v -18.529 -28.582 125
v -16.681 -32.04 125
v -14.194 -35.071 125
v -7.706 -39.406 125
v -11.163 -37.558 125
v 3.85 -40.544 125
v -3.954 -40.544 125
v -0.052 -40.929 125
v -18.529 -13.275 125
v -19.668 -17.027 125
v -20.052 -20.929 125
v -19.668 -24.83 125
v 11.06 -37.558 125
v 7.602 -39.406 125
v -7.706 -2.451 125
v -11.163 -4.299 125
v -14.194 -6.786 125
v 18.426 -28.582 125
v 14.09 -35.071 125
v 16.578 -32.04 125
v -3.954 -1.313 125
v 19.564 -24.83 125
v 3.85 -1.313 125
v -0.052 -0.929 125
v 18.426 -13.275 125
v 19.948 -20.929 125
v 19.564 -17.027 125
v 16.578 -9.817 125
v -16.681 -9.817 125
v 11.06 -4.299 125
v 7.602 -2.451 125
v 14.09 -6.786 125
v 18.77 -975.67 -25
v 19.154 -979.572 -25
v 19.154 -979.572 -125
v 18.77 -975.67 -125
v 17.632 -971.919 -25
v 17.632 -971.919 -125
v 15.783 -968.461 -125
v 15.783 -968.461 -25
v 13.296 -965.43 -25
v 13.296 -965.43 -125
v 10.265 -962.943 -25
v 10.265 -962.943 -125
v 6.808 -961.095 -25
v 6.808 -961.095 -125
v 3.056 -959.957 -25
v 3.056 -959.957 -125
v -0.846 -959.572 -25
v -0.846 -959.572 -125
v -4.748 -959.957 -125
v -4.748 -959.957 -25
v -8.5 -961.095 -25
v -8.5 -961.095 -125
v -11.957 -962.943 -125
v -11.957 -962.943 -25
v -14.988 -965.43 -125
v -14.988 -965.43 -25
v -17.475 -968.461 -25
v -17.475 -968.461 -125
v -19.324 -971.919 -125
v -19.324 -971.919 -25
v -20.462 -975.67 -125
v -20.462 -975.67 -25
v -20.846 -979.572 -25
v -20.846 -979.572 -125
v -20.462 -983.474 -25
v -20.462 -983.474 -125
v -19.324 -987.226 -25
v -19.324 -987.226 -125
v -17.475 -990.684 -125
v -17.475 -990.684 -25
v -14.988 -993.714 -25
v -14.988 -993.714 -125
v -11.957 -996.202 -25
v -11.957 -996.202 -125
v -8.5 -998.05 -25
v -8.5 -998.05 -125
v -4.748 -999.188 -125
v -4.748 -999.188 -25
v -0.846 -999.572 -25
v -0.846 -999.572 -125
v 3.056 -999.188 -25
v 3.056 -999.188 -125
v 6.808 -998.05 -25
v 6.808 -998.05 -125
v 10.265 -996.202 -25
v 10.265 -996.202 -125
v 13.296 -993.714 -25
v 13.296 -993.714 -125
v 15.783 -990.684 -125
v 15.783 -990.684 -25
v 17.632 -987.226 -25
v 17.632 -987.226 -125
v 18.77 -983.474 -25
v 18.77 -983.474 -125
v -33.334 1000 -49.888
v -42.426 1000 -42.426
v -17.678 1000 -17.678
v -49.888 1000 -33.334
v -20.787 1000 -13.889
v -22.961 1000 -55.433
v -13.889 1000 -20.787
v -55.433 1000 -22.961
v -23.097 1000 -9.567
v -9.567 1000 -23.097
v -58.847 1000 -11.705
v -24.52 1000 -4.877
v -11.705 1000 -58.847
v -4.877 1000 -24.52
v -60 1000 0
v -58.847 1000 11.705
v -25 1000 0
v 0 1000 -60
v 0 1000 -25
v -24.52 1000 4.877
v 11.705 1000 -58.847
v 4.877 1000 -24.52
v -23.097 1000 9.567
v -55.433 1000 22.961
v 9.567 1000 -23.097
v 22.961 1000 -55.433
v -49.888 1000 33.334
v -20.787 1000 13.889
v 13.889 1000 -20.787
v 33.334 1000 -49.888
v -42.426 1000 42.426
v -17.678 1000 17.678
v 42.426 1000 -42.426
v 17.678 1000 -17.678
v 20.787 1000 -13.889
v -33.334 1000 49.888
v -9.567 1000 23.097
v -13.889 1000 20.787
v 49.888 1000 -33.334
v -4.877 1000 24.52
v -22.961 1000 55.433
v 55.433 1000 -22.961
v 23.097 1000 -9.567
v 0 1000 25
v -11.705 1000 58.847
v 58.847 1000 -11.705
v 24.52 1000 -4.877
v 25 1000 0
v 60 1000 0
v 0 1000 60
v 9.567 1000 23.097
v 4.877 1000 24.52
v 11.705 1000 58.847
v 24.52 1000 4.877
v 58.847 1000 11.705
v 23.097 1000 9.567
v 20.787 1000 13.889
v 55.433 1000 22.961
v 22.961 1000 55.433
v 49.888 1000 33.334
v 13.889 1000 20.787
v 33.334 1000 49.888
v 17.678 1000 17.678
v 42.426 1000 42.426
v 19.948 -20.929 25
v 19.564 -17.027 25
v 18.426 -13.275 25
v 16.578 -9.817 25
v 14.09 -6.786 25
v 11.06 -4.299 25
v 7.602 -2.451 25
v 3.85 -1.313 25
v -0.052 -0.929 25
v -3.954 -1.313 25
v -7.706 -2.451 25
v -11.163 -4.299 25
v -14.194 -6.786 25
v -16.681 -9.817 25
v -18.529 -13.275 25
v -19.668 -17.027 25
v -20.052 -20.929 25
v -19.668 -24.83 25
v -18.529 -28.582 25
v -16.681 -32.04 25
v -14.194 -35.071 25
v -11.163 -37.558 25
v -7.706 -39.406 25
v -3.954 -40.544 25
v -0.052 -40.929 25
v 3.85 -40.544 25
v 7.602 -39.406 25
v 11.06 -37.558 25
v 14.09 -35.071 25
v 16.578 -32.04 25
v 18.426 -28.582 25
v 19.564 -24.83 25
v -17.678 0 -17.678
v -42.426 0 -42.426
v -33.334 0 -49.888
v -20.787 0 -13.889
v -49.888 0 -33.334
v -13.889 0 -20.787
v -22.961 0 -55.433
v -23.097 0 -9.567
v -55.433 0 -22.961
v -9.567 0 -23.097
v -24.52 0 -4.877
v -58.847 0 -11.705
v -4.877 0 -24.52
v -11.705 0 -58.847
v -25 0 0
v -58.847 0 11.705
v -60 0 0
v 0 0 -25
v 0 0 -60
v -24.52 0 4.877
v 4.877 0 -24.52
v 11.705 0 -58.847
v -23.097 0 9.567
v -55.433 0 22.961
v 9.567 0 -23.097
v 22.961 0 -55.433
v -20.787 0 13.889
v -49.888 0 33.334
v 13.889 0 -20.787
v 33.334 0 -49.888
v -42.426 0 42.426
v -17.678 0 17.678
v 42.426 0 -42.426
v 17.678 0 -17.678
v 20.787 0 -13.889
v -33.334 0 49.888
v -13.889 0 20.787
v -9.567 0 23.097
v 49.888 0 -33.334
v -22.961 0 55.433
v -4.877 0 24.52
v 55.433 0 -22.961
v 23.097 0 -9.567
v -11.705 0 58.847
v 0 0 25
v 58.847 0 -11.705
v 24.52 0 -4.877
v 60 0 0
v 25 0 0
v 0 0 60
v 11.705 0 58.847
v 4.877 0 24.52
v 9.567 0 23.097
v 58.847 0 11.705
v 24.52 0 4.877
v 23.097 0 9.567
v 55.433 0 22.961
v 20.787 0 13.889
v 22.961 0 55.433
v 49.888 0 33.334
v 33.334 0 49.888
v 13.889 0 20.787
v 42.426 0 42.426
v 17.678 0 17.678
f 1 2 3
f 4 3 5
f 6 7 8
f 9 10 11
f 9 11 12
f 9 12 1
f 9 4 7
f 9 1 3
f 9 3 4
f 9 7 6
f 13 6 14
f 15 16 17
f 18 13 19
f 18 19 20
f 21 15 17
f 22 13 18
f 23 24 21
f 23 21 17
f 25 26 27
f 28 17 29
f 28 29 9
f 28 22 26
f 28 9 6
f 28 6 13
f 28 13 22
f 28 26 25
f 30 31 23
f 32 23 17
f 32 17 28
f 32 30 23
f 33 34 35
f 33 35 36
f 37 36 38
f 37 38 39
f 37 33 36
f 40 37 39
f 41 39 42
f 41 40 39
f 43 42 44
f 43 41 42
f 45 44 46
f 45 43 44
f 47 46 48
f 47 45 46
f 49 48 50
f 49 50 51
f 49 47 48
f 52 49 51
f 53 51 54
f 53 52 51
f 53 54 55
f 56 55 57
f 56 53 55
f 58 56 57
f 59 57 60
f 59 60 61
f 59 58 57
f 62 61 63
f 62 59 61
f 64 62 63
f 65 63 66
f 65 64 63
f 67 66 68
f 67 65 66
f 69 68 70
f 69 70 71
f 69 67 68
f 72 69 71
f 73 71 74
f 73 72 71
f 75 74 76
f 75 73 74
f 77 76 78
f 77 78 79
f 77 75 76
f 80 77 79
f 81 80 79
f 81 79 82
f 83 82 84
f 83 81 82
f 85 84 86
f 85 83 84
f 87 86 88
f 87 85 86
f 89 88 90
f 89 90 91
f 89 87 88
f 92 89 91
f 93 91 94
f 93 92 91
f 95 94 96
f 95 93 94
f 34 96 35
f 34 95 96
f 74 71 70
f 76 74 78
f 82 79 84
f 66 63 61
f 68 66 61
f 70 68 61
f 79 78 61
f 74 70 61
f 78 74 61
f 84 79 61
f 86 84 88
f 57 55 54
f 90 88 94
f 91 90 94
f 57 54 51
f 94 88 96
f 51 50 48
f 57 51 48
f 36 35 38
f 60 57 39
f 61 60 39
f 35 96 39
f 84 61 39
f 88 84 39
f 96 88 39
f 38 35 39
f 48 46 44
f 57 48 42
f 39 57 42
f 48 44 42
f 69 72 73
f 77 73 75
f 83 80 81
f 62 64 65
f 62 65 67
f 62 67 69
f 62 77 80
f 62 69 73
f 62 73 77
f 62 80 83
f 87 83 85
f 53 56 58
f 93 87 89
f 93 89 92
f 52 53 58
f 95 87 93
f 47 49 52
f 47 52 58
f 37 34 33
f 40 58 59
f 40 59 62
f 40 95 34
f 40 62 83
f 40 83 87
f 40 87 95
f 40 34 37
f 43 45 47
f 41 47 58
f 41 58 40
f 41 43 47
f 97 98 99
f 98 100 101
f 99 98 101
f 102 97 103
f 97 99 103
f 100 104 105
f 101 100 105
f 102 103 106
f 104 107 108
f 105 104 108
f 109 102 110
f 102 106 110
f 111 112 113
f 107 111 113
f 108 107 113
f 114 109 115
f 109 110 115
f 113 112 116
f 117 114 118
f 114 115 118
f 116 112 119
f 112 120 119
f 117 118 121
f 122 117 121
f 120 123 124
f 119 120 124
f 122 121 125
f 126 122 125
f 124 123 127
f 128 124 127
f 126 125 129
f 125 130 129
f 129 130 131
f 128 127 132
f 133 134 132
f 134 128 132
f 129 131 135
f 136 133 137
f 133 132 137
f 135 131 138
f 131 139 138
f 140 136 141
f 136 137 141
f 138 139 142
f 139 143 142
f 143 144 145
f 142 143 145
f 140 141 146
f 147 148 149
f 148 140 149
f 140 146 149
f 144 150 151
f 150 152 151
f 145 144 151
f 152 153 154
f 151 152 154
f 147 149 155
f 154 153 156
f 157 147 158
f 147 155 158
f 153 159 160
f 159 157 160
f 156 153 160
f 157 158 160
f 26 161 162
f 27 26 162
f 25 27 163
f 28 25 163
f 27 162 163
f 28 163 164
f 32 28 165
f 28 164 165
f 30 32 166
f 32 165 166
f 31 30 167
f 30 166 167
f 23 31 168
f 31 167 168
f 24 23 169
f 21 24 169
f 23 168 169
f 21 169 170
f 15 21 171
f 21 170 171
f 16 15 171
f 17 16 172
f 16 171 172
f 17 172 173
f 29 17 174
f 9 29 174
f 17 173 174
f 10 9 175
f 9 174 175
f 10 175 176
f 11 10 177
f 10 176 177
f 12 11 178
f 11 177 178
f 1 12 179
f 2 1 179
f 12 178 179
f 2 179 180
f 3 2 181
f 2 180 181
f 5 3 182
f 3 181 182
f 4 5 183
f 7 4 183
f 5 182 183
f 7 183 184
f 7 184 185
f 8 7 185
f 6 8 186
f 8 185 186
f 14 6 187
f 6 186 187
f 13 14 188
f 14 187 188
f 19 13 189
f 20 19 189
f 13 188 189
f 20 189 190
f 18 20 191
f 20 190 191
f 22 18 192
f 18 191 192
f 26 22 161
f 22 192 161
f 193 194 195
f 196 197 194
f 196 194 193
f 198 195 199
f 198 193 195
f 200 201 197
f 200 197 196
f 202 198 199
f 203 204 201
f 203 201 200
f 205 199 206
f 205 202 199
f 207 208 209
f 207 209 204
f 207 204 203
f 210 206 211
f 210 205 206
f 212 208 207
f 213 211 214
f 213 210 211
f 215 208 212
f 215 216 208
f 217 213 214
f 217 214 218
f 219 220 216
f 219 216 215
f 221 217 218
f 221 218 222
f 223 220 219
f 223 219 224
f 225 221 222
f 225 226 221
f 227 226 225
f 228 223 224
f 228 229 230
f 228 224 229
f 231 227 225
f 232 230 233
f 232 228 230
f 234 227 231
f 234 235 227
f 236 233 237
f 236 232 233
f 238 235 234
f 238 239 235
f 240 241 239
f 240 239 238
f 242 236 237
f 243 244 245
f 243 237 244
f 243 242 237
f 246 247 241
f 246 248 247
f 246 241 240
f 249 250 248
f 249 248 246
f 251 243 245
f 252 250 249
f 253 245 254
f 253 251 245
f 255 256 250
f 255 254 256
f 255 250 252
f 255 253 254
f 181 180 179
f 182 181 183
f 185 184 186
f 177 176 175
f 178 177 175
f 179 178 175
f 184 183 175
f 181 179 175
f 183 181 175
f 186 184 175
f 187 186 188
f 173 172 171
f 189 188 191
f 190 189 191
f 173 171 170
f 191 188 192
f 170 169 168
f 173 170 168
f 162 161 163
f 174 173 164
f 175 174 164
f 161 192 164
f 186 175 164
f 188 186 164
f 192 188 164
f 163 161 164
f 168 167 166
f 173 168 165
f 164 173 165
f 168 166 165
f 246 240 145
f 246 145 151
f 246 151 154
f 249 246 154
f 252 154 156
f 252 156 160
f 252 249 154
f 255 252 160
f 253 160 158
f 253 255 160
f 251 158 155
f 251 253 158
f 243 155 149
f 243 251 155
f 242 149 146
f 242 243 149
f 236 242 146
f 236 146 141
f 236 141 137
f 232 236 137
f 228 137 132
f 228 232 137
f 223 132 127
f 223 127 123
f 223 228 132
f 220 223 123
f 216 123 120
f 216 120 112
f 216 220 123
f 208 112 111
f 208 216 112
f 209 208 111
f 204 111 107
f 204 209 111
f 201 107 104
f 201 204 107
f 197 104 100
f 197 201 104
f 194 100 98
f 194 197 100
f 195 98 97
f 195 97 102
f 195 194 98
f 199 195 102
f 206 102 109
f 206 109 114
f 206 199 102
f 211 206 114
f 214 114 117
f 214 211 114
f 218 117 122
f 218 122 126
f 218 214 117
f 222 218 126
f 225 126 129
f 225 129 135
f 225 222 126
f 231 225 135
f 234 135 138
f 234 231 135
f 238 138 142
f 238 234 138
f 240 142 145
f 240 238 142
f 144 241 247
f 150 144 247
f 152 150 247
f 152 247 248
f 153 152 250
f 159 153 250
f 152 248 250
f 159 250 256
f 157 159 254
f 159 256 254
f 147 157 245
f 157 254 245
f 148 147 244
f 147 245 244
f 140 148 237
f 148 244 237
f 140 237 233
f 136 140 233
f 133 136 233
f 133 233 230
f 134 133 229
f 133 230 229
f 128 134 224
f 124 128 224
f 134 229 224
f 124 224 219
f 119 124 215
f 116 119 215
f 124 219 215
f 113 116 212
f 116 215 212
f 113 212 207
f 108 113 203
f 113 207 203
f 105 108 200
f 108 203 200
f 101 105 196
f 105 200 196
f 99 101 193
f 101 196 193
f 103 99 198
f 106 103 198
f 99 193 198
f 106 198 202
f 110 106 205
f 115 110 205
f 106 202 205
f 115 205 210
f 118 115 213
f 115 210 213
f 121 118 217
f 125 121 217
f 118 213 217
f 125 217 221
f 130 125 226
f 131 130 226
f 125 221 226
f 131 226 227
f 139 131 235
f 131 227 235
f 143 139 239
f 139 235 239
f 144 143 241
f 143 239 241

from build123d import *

# Parameters (mm, degrees)
F0_R     = 60
F0_R_2   = 25
F1_DEPTH = 1000
F3_START = 25
F2_R     = 20
F3_DEPTH = 100
F5_START = -25
F4_R     = 20
F5_DEPTH = 100


with BuildPart() as f1:
    # F0 (on Front) → F1 (new body)
    with BuildSketch(Plane.XZ):
        Circle(F0_R)
        Circle(F0_R_2, mode=Mode.SUBTRACT)
    extrude(amount=-F1_DEPTH)


with BuildPart() as f3:
    # F2 (on Top) → F3 (new body)
    with BuildSketch(Plane.XY.offset(F3_START)):
        with Locations((-0.0518769739, -20.9285784513)):
            Circle(F2_R)
    extrude(amount=F3_DEPTH)


with BuildPart() as f5:
    # F4 (on Top) → F5 (new body)
    with BuildSketch(Plane.XY.offset(F5_START)):
        with Locations((-0.8460676181, -979.5722365379)):
            Circle(F4_R)
    extrude(amount=-F5_DEPTH)


solid = Compound([f1.part, f3.part, f5.part])
